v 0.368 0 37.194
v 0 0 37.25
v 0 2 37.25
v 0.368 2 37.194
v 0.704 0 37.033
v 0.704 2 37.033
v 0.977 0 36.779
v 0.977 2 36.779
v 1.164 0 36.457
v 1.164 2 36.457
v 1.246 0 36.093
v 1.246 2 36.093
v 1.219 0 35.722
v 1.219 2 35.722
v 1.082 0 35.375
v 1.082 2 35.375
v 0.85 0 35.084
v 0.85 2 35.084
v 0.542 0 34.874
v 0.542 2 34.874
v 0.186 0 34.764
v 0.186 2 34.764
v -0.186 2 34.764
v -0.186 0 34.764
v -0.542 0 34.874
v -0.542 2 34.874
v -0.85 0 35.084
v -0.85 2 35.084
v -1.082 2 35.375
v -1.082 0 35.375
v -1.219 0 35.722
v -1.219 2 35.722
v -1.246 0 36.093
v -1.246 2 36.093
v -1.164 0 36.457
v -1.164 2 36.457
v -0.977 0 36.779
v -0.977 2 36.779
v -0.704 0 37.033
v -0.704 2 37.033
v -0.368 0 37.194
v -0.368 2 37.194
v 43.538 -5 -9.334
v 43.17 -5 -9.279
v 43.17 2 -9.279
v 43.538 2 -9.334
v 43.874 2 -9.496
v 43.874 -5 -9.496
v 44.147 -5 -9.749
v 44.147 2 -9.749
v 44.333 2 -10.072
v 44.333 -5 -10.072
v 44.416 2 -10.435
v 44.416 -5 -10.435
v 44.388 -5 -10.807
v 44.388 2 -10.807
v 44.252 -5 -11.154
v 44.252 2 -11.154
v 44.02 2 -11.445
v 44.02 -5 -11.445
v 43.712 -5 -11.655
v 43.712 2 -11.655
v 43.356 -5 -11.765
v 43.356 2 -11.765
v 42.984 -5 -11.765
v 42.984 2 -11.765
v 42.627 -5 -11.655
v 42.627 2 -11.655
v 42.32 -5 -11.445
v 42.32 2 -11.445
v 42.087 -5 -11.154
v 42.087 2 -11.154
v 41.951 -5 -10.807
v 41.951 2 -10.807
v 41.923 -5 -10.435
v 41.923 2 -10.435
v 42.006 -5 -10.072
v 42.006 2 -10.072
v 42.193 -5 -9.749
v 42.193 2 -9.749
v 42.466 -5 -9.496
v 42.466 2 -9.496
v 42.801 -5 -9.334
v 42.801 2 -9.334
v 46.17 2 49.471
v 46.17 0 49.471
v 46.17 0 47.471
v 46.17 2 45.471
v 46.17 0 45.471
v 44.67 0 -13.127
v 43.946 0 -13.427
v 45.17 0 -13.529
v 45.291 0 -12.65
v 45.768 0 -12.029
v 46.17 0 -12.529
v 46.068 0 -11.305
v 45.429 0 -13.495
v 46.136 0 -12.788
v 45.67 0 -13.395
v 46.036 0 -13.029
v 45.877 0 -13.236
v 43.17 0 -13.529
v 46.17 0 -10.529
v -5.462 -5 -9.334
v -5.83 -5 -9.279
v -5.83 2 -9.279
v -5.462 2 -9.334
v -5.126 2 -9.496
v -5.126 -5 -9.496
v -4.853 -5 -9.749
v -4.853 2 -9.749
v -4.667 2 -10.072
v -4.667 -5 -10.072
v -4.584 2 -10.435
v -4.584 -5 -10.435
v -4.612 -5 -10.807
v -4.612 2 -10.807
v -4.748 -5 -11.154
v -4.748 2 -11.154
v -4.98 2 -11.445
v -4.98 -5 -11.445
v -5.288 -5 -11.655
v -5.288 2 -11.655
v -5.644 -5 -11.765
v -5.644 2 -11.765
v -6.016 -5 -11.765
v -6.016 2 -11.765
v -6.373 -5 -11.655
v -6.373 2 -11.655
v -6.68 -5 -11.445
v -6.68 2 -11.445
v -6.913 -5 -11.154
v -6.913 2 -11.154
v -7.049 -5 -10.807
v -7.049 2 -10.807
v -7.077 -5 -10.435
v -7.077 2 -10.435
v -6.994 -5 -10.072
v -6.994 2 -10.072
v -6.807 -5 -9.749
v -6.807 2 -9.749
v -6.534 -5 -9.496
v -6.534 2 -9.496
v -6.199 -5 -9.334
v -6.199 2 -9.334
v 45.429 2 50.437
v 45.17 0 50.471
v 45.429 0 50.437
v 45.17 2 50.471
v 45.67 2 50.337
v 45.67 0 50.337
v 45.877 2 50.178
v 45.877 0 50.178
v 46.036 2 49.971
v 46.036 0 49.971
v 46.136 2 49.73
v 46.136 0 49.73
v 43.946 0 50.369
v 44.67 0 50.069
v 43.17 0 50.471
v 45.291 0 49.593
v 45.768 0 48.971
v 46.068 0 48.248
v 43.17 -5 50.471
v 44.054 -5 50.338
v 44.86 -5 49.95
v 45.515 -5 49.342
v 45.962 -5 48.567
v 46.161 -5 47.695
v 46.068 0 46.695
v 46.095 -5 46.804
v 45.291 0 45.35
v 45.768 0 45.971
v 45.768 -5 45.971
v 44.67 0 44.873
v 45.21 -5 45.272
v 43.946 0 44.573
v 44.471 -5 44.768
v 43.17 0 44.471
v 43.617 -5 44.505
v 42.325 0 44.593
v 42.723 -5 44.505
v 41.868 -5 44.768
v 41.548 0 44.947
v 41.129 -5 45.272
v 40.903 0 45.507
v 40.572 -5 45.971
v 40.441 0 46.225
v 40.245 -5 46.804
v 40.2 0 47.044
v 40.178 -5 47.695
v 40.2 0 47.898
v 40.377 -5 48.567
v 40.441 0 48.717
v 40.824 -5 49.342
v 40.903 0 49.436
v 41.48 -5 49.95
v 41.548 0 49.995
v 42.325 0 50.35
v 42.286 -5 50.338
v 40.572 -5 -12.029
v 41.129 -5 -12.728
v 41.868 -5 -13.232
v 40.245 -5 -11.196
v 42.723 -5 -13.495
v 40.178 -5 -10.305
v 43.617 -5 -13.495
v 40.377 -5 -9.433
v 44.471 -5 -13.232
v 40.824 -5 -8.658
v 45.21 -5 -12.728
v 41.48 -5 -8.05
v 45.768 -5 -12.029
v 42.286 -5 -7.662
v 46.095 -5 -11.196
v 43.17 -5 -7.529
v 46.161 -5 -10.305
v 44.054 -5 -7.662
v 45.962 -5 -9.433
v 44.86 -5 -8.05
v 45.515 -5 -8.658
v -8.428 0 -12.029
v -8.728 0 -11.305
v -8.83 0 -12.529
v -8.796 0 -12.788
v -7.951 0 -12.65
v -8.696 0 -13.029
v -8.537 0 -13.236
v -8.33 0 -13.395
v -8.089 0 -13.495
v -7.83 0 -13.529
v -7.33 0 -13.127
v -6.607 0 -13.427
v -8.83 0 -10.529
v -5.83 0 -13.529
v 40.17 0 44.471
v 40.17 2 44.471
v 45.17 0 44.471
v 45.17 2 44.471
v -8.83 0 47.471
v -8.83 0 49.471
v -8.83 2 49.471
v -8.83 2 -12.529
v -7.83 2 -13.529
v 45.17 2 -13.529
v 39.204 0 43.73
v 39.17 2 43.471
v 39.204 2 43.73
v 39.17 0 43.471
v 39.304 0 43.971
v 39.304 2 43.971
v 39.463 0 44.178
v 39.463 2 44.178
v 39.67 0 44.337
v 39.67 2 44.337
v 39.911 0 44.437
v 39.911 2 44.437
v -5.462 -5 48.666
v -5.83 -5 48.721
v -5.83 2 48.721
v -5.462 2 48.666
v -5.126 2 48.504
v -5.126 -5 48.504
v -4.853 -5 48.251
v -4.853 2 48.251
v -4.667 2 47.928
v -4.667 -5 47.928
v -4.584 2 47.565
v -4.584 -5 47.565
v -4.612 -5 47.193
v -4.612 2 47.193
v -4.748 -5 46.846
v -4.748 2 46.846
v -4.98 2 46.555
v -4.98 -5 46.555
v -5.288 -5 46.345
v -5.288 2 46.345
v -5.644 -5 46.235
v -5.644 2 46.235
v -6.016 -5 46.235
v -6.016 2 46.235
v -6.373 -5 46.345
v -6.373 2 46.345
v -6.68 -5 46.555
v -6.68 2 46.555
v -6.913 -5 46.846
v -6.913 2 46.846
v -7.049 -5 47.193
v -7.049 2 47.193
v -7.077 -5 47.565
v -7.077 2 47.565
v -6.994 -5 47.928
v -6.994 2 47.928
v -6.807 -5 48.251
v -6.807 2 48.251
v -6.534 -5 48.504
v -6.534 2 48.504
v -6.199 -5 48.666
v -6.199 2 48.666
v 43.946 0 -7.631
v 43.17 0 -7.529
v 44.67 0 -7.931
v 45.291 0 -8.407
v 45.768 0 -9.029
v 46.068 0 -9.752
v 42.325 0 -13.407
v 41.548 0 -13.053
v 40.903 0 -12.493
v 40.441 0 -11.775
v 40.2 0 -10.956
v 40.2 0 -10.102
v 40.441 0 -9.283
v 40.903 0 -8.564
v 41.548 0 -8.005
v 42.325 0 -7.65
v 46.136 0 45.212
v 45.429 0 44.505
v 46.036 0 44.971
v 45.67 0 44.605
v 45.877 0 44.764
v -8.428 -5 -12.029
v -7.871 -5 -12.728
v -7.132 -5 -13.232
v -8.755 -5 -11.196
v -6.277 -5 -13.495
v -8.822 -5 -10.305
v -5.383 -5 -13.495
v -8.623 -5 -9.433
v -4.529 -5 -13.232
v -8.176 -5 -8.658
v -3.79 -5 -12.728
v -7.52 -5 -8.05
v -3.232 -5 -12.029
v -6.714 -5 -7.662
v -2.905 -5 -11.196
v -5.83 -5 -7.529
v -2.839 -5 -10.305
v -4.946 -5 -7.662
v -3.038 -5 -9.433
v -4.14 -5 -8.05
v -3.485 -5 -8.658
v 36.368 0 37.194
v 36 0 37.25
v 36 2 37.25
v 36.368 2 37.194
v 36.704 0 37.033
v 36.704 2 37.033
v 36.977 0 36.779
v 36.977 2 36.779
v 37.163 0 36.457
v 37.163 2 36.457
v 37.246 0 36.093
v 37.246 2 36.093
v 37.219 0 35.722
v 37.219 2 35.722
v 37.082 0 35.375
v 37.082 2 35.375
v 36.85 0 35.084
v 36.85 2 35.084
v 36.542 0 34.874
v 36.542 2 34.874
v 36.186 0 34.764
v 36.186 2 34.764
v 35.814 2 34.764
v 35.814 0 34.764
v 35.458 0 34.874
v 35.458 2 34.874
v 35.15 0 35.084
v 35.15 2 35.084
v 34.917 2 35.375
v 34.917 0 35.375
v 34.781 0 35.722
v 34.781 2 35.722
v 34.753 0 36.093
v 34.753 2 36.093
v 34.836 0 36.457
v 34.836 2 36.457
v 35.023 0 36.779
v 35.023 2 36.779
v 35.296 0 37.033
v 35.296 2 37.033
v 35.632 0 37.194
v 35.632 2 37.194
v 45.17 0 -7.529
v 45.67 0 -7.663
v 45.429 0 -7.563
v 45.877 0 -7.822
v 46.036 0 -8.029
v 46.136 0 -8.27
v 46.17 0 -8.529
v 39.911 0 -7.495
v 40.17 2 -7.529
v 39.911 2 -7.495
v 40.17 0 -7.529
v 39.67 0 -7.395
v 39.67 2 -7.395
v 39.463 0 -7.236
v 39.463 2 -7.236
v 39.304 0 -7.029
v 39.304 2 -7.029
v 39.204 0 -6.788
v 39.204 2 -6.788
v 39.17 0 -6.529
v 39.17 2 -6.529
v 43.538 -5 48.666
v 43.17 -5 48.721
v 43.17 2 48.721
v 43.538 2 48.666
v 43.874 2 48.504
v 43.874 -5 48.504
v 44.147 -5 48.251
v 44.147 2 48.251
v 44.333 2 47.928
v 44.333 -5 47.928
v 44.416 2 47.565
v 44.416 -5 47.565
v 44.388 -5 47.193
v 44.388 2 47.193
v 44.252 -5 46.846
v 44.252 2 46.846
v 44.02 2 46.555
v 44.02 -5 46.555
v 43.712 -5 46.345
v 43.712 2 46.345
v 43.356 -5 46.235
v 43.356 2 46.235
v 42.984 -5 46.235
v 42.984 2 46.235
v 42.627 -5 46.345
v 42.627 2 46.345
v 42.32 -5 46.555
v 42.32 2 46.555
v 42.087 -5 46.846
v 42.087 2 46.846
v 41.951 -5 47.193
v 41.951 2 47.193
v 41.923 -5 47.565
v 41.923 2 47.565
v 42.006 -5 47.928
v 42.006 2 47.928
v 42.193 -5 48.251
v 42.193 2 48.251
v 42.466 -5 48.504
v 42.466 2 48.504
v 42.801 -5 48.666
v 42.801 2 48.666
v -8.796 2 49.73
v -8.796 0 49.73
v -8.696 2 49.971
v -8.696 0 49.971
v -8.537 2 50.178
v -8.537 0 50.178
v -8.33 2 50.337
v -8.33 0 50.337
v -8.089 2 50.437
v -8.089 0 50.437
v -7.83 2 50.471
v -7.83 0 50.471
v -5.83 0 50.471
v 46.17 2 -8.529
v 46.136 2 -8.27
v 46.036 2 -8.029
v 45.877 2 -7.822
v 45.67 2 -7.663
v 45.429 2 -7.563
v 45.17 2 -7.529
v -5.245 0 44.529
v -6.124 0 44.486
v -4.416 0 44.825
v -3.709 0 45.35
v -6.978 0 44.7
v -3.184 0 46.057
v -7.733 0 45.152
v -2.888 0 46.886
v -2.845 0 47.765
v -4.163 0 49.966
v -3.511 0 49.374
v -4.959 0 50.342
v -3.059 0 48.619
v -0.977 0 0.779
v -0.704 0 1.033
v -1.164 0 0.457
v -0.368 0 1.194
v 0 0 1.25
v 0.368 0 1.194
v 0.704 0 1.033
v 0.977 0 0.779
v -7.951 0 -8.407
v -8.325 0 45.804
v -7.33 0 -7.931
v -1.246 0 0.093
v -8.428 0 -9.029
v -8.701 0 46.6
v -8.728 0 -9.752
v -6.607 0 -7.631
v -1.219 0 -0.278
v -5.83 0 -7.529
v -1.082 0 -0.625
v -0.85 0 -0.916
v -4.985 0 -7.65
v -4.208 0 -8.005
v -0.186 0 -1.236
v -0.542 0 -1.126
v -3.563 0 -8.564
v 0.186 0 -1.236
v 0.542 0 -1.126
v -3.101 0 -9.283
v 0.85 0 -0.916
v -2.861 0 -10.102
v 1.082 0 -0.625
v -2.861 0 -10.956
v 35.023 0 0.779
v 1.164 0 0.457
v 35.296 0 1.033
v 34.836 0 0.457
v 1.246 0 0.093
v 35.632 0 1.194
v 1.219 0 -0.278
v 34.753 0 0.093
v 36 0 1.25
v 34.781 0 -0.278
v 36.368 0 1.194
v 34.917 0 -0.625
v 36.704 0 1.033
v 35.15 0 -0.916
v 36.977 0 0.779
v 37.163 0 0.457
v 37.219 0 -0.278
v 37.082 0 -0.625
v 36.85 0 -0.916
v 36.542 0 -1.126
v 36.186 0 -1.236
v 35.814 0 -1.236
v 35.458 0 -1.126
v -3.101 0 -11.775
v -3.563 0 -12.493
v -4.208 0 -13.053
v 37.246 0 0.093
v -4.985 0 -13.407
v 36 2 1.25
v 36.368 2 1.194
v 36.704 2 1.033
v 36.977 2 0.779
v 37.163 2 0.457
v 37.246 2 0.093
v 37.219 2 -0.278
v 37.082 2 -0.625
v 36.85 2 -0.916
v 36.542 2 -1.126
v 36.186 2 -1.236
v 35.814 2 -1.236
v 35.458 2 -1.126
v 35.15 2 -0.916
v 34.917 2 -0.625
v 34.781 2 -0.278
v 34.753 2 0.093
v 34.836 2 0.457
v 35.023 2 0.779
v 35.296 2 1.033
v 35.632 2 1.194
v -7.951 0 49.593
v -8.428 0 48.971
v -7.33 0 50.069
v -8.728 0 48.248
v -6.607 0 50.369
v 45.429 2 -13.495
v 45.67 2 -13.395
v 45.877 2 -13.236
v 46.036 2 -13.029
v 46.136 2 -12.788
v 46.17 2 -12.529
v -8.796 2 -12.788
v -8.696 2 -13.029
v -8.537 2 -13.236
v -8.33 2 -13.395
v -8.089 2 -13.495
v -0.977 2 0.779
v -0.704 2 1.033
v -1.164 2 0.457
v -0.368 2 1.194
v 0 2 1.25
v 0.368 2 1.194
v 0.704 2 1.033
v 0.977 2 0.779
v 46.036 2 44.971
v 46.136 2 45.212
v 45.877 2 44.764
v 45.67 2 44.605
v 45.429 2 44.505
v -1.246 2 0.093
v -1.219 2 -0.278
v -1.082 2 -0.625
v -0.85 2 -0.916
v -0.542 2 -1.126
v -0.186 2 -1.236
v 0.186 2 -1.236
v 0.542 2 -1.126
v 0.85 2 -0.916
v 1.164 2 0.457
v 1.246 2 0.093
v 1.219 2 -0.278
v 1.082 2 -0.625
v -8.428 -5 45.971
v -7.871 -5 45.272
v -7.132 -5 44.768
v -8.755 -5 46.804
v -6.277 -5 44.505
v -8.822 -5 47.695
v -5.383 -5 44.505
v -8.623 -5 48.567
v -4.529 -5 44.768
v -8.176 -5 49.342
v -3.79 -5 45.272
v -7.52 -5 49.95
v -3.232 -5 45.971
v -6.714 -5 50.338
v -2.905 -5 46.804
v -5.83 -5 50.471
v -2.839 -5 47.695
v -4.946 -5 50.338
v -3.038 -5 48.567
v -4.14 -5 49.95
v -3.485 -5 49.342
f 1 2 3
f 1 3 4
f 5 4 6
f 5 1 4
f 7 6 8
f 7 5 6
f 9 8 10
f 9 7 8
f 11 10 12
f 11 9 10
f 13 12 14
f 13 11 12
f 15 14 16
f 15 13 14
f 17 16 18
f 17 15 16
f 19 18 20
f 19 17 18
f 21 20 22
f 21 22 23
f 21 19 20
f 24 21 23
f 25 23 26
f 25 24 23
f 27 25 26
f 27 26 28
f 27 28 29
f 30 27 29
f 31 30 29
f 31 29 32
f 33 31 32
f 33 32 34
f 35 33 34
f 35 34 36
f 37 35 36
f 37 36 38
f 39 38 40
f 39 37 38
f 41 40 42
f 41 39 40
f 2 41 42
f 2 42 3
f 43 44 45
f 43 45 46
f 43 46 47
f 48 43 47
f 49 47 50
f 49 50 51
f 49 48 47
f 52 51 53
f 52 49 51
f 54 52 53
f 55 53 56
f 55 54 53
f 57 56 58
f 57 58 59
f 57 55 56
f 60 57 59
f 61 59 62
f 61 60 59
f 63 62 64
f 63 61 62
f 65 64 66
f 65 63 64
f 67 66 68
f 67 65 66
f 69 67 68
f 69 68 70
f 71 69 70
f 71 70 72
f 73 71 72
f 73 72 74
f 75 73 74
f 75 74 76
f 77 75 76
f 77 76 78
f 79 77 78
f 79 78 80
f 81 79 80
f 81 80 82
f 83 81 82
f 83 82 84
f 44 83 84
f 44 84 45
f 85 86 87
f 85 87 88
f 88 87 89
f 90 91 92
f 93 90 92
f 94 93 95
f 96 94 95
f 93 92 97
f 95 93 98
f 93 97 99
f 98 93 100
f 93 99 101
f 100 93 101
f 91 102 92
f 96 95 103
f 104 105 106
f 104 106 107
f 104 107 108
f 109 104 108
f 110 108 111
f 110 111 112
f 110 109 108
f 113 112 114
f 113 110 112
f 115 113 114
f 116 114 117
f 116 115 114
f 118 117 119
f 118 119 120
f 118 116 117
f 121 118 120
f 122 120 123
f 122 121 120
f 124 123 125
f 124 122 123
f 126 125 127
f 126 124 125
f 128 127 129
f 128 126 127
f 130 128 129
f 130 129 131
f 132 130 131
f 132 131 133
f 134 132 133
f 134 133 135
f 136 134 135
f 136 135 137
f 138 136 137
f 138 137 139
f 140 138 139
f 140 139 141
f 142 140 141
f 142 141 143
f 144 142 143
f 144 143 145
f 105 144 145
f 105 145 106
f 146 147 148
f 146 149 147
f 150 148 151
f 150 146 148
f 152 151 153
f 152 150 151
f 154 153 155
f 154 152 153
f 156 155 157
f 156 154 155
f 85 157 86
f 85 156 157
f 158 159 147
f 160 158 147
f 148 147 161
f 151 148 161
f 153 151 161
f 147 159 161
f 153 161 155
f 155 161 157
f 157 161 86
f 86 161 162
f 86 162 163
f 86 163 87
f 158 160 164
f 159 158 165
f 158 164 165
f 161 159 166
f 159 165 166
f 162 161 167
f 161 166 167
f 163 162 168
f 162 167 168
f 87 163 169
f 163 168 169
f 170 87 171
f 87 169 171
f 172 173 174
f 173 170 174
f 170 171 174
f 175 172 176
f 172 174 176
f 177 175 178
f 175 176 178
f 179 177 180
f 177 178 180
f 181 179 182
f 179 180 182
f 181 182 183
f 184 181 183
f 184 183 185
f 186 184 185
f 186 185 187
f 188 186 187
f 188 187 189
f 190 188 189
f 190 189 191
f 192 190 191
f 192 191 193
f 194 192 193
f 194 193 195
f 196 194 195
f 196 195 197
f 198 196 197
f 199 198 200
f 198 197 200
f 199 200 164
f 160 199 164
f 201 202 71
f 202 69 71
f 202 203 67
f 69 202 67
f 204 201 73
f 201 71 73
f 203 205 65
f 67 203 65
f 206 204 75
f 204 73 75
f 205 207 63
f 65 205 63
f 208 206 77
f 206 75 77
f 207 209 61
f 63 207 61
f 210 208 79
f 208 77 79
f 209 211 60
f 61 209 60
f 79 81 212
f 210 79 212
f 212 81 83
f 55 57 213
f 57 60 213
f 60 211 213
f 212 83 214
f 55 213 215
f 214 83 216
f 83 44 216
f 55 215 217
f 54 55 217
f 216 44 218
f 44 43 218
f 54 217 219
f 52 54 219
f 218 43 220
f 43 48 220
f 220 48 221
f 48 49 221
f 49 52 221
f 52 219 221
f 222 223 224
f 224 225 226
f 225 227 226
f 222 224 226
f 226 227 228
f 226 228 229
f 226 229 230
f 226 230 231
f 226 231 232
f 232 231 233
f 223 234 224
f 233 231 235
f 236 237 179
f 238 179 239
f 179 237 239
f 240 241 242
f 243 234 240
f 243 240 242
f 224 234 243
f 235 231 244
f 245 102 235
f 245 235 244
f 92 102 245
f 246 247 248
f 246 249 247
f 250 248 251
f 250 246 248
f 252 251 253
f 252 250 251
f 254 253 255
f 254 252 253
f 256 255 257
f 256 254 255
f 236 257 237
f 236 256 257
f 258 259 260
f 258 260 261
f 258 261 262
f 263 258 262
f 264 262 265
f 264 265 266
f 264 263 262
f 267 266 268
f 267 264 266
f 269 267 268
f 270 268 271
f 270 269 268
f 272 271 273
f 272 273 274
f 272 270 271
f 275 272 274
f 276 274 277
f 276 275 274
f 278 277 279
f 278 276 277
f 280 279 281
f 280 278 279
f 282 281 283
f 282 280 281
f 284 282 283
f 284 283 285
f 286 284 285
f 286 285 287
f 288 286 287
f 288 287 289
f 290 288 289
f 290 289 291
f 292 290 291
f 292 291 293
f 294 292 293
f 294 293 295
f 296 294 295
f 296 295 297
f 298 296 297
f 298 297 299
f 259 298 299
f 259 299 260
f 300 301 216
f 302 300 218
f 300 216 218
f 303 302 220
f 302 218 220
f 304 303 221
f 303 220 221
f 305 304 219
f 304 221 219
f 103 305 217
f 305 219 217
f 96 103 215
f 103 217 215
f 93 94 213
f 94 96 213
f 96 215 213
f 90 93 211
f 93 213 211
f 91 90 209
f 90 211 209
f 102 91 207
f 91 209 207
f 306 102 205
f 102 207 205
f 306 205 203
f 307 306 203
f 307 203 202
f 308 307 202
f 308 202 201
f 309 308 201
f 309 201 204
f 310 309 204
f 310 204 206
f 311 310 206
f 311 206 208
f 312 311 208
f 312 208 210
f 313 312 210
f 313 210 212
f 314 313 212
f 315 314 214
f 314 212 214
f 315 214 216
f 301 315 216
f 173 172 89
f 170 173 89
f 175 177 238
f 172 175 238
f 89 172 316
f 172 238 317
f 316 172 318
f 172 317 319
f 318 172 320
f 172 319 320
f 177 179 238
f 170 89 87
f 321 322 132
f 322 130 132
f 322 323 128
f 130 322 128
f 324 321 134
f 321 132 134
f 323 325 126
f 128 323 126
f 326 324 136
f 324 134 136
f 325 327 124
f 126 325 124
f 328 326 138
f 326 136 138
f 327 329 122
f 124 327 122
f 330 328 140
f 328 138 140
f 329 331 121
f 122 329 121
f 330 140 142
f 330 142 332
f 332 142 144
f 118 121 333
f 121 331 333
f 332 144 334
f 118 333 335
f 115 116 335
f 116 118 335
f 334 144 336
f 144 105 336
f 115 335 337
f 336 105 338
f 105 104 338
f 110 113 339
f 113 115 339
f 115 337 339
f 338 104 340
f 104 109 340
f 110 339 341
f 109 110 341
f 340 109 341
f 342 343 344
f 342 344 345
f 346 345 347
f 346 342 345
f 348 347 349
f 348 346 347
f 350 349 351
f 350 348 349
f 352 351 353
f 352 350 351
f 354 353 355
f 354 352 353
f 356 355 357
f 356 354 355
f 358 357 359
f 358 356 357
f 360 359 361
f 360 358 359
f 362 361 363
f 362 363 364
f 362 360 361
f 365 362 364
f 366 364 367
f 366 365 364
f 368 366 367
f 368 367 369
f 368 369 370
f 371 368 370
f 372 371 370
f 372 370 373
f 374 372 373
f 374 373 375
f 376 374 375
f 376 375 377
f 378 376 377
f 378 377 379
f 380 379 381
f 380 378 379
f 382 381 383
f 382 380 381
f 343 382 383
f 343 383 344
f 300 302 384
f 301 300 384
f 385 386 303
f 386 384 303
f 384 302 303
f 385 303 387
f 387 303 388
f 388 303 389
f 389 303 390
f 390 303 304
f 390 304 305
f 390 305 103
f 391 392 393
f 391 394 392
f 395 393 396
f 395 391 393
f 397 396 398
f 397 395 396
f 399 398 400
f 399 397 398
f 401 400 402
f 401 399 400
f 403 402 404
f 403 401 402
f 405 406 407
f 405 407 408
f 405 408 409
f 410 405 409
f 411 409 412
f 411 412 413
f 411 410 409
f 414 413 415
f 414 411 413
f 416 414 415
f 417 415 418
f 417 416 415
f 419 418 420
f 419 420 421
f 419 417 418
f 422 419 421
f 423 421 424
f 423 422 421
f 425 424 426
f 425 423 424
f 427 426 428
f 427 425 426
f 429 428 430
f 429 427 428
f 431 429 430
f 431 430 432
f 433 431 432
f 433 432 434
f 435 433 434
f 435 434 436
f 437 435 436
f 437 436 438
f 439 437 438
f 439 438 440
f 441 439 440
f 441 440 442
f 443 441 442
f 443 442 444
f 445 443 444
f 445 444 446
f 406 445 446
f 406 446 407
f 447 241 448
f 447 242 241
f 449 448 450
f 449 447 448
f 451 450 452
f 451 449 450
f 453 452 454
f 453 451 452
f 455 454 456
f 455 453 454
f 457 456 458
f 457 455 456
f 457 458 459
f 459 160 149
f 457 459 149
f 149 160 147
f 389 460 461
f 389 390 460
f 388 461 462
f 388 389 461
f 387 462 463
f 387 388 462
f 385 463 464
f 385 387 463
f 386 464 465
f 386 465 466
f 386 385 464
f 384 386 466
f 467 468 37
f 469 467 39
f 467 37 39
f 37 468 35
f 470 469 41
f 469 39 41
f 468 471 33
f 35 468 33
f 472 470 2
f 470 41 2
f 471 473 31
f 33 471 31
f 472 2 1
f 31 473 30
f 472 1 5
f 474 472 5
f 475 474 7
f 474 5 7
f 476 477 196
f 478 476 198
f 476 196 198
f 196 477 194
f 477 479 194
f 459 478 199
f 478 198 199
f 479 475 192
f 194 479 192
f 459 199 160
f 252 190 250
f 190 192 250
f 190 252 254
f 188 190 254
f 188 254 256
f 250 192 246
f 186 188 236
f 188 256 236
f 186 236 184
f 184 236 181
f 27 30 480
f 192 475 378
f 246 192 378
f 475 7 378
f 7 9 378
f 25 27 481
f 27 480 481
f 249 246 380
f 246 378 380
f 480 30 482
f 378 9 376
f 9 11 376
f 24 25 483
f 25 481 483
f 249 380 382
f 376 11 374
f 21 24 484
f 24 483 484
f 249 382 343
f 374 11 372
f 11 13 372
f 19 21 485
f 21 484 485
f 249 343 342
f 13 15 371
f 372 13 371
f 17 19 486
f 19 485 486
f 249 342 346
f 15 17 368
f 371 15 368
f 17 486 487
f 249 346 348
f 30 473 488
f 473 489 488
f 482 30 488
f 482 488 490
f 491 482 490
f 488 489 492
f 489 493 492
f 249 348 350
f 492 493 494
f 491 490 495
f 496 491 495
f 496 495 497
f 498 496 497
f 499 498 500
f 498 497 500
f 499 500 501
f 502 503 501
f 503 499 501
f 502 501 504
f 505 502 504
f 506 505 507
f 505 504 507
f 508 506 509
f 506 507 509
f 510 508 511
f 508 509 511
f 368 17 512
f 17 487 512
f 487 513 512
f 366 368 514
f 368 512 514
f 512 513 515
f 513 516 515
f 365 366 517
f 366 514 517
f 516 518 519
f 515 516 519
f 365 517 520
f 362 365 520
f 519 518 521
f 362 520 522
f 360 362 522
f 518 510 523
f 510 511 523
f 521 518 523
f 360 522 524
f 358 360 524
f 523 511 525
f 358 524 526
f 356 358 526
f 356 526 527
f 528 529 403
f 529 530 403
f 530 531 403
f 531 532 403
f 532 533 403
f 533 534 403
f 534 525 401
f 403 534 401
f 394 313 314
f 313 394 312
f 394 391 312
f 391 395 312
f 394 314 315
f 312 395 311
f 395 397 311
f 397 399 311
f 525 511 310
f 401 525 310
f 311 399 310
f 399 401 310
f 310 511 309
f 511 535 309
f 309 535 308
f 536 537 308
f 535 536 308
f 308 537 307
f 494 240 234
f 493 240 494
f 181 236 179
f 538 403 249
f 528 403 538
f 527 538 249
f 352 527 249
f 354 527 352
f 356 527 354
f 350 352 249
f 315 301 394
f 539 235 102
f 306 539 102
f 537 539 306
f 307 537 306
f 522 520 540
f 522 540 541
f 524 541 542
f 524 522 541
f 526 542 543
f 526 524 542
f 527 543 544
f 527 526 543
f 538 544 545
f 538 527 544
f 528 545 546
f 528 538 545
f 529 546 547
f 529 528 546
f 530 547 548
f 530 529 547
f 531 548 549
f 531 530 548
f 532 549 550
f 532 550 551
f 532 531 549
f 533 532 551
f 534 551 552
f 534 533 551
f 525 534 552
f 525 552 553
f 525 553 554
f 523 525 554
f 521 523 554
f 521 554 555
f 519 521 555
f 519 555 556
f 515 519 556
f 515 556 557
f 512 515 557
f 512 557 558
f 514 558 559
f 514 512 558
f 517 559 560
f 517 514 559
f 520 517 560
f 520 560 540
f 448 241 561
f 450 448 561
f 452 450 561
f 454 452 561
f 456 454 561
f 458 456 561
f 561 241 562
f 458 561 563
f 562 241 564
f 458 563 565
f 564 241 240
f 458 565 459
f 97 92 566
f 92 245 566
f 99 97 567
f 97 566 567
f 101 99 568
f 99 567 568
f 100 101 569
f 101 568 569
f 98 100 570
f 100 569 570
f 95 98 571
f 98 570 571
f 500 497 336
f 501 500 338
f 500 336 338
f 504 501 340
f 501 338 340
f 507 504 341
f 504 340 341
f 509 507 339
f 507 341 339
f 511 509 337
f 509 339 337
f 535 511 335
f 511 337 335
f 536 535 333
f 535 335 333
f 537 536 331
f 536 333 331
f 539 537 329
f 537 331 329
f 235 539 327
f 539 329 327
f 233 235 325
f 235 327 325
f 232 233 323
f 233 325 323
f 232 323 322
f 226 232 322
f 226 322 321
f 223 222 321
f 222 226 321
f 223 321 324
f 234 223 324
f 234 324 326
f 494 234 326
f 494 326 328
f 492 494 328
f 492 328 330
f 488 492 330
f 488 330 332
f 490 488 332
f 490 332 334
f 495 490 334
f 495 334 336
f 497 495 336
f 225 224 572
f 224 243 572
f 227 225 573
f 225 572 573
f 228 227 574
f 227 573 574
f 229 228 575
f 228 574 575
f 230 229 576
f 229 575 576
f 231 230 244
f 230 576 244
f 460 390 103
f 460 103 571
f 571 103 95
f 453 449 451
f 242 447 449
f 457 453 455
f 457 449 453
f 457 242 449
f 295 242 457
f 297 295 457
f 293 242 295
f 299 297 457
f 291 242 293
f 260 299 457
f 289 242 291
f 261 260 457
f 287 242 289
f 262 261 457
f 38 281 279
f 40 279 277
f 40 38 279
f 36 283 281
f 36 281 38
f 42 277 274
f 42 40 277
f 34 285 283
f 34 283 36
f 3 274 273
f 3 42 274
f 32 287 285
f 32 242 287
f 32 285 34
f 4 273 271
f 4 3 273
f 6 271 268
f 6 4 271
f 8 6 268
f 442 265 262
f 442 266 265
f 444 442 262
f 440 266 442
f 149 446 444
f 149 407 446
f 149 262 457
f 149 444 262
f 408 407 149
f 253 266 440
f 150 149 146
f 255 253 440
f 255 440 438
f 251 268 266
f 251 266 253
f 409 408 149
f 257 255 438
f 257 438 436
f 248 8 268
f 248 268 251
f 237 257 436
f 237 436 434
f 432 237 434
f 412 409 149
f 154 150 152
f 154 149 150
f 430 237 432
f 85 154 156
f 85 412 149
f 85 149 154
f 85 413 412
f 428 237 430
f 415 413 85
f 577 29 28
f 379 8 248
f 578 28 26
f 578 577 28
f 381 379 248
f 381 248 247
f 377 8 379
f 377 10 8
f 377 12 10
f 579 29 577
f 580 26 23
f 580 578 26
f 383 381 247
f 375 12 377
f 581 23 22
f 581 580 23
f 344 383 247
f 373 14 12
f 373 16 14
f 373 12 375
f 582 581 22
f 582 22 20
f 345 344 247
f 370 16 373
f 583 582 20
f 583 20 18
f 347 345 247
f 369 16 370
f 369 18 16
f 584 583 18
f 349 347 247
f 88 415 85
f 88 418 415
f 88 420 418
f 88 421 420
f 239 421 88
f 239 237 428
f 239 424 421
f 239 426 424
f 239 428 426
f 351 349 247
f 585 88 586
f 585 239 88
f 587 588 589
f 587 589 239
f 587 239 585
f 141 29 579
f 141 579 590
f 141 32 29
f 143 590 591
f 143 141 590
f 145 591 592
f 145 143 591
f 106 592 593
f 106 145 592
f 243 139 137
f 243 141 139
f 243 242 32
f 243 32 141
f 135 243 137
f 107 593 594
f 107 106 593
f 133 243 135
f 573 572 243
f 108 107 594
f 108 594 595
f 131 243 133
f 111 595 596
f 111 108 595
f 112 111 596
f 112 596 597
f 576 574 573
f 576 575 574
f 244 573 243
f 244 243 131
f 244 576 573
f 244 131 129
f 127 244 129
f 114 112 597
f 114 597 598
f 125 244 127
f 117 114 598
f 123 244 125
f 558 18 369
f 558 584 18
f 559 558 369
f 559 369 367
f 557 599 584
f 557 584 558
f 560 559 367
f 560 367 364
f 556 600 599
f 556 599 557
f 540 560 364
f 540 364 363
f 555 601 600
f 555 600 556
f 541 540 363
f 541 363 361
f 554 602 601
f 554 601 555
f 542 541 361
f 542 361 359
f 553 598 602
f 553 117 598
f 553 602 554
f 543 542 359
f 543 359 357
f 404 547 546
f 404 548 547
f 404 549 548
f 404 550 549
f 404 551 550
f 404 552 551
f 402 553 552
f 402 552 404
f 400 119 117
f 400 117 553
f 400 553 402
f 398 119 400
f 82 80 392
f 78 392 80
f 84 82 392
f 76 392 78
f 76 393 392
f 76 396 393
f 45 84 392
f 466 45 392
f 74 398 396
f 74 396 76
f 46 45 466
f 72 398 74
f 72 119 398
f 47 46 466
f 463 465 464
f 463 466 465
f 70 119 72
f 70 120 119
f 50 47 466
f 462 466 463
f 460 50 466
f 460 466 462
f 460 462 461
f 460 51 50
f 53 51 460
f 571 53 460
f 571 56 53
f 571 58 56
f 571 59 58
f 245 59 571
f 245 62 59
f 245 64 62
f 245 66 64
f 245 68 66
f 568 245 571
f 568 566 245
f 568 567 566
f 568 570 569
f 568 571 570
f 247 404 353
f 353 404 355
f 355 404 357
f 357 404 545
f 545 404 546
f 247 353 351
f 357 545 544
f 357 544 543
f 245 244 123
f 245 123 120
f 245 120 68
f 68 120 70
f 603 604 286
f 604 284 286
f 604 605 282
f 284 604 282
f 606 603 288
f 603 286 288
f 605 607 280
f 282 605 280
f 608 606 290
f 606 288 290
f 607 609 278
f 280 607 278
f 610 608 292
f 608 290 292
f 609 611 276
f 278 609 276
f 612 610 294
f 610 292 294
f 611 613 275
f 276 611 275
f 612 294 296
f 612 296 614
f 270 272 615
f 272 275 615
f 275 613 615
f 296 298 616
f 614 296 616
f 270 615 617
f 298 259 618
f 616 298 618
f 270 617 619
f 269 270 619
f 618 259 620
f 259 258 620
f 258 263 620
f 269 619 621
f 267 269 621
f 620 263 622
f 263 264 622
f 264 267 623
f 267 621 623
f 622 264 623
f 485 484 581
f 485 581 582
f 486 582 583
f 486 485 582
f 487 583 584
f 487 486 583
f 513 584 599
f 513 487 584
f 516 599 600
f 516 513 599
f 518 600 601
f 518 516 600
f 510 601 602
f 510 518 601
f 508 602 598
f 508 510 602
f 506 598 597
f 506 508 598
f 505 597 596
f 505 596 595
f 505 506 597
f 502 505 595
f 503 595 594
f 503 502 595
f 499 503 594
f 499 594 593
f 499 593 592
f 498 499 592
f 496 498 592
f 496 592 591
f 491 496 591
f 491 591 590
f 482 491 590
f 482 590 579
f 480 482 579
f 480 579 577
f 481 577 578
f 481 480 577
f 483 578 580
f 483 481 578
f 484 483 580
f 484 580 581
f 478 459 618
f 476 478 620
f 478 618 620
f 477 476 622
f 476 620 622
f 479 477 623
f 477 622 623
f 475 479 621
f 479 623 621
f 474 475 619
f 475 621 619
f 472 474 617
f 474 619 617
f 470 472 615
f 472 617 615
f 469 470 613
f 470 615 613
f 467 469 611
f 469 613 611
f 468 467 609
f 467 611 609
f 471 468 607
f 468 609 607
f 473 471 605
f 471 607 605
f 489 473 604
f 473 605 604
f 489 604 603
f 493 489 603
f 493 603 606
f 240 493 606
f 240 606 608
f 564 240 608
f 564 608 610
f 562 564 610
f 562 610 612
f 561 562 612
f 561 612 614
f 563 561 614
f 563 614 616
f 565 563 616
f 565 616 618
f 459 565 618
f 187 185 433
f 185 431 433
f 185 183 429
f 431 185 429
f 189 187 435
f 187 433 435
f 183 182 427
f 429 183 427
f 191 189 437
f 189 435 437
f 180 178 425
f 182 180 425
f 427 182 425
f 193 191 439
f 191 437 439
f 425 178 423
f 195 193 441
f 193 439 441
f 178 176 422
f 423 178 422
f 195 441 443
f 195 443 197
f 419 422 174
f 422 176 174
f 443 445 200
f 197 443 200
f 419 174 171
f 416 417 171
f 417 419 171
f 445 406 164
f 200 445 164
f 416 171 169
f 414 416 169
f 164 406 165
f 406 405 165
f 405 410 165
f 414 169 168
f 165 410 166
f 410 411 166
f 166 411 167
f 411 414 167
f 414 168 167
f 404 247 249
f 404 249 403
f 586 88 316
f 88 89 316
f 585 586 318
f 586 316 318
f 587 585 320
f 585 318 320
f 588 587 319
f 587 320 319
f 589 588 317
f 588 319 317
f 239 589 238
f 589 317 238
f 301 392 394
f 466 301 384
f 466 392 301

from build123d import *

# Parameters (mm, degrees)
SKETCH2_W           = 55
SKETCH2_H           = 64
SKETCH2_R           = 1.25
SKETCH2_R_2         = 1.249934
BOSS_EXTRUDE1_DEPTH = 2
SKETCH4_W           = 7
SKETCH4_H           = 52
CUT_EXTRUDE1_DEPTH  = 2
FILLET1_R           = 1
BOSS_EXTRUDE2_START = -7
SKETCH5_R           = 3
SKETCH5_R_2         = 1.25
BOSS_EXTRUDE2_DEPTH = 7


with BuildPart() as part:
    # Sketch2 → Boss-Extrude1 (new body)
    with BuildSketch(Plane(origin=(0, 0, 0), x_dir=(1, 0, 0), z_dir=(0, 1, 0))):
        with Locations((18.669829868, -18.471180694)):
            Rectangle(SKETCH2_W, SKETCH2_H)
        with Locations(Location((-5.830170132, 10.528819306, 0), (0, 0, 270))):
            Circle(SKETCH2_R, mode=Mode.SUBTRACT)
        with Locations(Location((-5.830170132, -47.471180694, 0), (0, 0, 270))):
            Circle(SKETCH2_R, mode=Mode.SUBTRACT)
        with Locations(Location((43.169829868, -47.471180694, 0), (0, 0, 270))):
            Circle(SKETCH2_R, mode=Mode.SUBTRACT)
        with Locations(Location((43.169829868, 10.528819306, 0), (0, 0, 270))):
            Circle(SKETCH2_R, mode=Mode.SUBTRACT)
        with Locations(Location((0, 0, 0), (0, 0, 270))):
            Circle(SKETCH2_R_2, mode=Mode.SUBTRACT)
        with Locations(Location((35.999928, 0, 0), (0, 0, 270))):
            Circle(SKETCH2_R_2, mode=Mode.SUBTRACT)
        with Locations(Location((0, -35.999928, 0), (0, 0, 270))):
            Circle(SKETCH2_R_2, mode=Mode.SUBTRACT)
        with Locations(Location((35.999928, -35.999928, 0), (0, 0, 270))):
            Circle(SKETCH2_R_2, mode=Mode.SUBTRACT)
    extrude(amount=BOSS_EXTRUDE1_DEPTH)

    # Sketch4 → Cut-Extrude1 (cut)
    with BuildSketch(Plane(origin=(0, 2, 0), x_dir=(1, 0, 0), z_dir=(0, 1, 0))):
        with Locations((42.669829868, -18.471180694)):
            Rectangle(SKETCH4_W, SKETCH4_H)
    extrude(amount=-CUT_EXTRUDE1_DEPTH, mode=Mode.SUBTRACT)

    # Fillet1
    fillet1_edges = [part.edges().sort_by_distance(p)[0] for p in [
        (46.169829868, 1, -13.528819306),
        (46.169829868, 1, 50.471180694),
        (-8.830170132, 1, 50.471180694),
        (-8.830170132, 1, -13.528819306),
        (46.169829868, 1, -7.528819306),
        (46.169829868, 1, 44.471180694),
        (39.169829868, 1, 44.471180694),
        (39.169829868, 1, -7.528819306),
    ]]
    fillet(fillet1_edges, radius=FILLET1_R)

    # Sketch5 → Boss-Extrude2 (add)
    # profile 1 of 4: a face of its own
    with BuildSketch(Plane(origin=(0, 2, 0), x_dir=(1, 0, 0), z_dir=(0, 1, 0)).offset(BOSS_EXTRUDE2_START)):
        with Locations(Location((-5.830170132, 10.528819306, 0), (0, 0, 270))):
            Circle(SKETCH5_R)
        with Locations(Location((-5.830170132, 10.528819306, 0), (0, 0, 270))):
            Circle(SKETCH5_R_2, mode=Mode.SUBTRACT)
    # profile 2 of 4: a face of its own
    with BuildSketch(Plane(origin=(0, 2, 0), x_dir=(1, 0, 0), z_dir=(0, 1, 0)).offset(BOSS_EXTRUDE2_START)):
        with Locations(Location((43.169829868, 10.528819306, 0), (0, 0, 270))):
            Circle(SKETCH5_R)
        with Locations(Location((43.169829868, 10.528819306, 0), (0, 0, 270))):
            Circle(SKETCH5_R_2, mode=Mode.SUBTRACT)
    # profile 3 of 4: a face of its own
    with BuildSketch(Plane(origin=(0, 2, 0), x_dir=(1, 0, 0), z_dir=(0, 1, 0)).offset(BOSS_EXTRUDE2_START)):
        with Locations(Location((43.169829868, -47.471180694, 0), (0, 0, 270))):
            Circle(SKETCH5_R)
        with Locations(Location((43.169829868, -47.471180694, 0), (0, 0, 270))):
            Circle(SKETCH5_R_2, mode=Mode.SUBTRACT)
    # profile 4 of 4: a face of its own
    with BuildSketch(Plane(origin=(0, 2, 0), x_dir=(1, 0, 0), z_dir=(0, 1, 0)).offset(BOSS_EXTRUDE2_START)):
        with Locations(Location((-5.830170132, -47.471180694, 0), (0, 0, 270))):
            Circle(SKETCH5_R)
        with Locations(Location((-5.830170132, -47.471180694, 0), (0, 0, 270))):
            Circle(SKETCH5_R_2, mode=Mode.SUBTRACT)
    extrude(amount=BOSS_EXTRUDE2_DEPTH)


solid = part.part
